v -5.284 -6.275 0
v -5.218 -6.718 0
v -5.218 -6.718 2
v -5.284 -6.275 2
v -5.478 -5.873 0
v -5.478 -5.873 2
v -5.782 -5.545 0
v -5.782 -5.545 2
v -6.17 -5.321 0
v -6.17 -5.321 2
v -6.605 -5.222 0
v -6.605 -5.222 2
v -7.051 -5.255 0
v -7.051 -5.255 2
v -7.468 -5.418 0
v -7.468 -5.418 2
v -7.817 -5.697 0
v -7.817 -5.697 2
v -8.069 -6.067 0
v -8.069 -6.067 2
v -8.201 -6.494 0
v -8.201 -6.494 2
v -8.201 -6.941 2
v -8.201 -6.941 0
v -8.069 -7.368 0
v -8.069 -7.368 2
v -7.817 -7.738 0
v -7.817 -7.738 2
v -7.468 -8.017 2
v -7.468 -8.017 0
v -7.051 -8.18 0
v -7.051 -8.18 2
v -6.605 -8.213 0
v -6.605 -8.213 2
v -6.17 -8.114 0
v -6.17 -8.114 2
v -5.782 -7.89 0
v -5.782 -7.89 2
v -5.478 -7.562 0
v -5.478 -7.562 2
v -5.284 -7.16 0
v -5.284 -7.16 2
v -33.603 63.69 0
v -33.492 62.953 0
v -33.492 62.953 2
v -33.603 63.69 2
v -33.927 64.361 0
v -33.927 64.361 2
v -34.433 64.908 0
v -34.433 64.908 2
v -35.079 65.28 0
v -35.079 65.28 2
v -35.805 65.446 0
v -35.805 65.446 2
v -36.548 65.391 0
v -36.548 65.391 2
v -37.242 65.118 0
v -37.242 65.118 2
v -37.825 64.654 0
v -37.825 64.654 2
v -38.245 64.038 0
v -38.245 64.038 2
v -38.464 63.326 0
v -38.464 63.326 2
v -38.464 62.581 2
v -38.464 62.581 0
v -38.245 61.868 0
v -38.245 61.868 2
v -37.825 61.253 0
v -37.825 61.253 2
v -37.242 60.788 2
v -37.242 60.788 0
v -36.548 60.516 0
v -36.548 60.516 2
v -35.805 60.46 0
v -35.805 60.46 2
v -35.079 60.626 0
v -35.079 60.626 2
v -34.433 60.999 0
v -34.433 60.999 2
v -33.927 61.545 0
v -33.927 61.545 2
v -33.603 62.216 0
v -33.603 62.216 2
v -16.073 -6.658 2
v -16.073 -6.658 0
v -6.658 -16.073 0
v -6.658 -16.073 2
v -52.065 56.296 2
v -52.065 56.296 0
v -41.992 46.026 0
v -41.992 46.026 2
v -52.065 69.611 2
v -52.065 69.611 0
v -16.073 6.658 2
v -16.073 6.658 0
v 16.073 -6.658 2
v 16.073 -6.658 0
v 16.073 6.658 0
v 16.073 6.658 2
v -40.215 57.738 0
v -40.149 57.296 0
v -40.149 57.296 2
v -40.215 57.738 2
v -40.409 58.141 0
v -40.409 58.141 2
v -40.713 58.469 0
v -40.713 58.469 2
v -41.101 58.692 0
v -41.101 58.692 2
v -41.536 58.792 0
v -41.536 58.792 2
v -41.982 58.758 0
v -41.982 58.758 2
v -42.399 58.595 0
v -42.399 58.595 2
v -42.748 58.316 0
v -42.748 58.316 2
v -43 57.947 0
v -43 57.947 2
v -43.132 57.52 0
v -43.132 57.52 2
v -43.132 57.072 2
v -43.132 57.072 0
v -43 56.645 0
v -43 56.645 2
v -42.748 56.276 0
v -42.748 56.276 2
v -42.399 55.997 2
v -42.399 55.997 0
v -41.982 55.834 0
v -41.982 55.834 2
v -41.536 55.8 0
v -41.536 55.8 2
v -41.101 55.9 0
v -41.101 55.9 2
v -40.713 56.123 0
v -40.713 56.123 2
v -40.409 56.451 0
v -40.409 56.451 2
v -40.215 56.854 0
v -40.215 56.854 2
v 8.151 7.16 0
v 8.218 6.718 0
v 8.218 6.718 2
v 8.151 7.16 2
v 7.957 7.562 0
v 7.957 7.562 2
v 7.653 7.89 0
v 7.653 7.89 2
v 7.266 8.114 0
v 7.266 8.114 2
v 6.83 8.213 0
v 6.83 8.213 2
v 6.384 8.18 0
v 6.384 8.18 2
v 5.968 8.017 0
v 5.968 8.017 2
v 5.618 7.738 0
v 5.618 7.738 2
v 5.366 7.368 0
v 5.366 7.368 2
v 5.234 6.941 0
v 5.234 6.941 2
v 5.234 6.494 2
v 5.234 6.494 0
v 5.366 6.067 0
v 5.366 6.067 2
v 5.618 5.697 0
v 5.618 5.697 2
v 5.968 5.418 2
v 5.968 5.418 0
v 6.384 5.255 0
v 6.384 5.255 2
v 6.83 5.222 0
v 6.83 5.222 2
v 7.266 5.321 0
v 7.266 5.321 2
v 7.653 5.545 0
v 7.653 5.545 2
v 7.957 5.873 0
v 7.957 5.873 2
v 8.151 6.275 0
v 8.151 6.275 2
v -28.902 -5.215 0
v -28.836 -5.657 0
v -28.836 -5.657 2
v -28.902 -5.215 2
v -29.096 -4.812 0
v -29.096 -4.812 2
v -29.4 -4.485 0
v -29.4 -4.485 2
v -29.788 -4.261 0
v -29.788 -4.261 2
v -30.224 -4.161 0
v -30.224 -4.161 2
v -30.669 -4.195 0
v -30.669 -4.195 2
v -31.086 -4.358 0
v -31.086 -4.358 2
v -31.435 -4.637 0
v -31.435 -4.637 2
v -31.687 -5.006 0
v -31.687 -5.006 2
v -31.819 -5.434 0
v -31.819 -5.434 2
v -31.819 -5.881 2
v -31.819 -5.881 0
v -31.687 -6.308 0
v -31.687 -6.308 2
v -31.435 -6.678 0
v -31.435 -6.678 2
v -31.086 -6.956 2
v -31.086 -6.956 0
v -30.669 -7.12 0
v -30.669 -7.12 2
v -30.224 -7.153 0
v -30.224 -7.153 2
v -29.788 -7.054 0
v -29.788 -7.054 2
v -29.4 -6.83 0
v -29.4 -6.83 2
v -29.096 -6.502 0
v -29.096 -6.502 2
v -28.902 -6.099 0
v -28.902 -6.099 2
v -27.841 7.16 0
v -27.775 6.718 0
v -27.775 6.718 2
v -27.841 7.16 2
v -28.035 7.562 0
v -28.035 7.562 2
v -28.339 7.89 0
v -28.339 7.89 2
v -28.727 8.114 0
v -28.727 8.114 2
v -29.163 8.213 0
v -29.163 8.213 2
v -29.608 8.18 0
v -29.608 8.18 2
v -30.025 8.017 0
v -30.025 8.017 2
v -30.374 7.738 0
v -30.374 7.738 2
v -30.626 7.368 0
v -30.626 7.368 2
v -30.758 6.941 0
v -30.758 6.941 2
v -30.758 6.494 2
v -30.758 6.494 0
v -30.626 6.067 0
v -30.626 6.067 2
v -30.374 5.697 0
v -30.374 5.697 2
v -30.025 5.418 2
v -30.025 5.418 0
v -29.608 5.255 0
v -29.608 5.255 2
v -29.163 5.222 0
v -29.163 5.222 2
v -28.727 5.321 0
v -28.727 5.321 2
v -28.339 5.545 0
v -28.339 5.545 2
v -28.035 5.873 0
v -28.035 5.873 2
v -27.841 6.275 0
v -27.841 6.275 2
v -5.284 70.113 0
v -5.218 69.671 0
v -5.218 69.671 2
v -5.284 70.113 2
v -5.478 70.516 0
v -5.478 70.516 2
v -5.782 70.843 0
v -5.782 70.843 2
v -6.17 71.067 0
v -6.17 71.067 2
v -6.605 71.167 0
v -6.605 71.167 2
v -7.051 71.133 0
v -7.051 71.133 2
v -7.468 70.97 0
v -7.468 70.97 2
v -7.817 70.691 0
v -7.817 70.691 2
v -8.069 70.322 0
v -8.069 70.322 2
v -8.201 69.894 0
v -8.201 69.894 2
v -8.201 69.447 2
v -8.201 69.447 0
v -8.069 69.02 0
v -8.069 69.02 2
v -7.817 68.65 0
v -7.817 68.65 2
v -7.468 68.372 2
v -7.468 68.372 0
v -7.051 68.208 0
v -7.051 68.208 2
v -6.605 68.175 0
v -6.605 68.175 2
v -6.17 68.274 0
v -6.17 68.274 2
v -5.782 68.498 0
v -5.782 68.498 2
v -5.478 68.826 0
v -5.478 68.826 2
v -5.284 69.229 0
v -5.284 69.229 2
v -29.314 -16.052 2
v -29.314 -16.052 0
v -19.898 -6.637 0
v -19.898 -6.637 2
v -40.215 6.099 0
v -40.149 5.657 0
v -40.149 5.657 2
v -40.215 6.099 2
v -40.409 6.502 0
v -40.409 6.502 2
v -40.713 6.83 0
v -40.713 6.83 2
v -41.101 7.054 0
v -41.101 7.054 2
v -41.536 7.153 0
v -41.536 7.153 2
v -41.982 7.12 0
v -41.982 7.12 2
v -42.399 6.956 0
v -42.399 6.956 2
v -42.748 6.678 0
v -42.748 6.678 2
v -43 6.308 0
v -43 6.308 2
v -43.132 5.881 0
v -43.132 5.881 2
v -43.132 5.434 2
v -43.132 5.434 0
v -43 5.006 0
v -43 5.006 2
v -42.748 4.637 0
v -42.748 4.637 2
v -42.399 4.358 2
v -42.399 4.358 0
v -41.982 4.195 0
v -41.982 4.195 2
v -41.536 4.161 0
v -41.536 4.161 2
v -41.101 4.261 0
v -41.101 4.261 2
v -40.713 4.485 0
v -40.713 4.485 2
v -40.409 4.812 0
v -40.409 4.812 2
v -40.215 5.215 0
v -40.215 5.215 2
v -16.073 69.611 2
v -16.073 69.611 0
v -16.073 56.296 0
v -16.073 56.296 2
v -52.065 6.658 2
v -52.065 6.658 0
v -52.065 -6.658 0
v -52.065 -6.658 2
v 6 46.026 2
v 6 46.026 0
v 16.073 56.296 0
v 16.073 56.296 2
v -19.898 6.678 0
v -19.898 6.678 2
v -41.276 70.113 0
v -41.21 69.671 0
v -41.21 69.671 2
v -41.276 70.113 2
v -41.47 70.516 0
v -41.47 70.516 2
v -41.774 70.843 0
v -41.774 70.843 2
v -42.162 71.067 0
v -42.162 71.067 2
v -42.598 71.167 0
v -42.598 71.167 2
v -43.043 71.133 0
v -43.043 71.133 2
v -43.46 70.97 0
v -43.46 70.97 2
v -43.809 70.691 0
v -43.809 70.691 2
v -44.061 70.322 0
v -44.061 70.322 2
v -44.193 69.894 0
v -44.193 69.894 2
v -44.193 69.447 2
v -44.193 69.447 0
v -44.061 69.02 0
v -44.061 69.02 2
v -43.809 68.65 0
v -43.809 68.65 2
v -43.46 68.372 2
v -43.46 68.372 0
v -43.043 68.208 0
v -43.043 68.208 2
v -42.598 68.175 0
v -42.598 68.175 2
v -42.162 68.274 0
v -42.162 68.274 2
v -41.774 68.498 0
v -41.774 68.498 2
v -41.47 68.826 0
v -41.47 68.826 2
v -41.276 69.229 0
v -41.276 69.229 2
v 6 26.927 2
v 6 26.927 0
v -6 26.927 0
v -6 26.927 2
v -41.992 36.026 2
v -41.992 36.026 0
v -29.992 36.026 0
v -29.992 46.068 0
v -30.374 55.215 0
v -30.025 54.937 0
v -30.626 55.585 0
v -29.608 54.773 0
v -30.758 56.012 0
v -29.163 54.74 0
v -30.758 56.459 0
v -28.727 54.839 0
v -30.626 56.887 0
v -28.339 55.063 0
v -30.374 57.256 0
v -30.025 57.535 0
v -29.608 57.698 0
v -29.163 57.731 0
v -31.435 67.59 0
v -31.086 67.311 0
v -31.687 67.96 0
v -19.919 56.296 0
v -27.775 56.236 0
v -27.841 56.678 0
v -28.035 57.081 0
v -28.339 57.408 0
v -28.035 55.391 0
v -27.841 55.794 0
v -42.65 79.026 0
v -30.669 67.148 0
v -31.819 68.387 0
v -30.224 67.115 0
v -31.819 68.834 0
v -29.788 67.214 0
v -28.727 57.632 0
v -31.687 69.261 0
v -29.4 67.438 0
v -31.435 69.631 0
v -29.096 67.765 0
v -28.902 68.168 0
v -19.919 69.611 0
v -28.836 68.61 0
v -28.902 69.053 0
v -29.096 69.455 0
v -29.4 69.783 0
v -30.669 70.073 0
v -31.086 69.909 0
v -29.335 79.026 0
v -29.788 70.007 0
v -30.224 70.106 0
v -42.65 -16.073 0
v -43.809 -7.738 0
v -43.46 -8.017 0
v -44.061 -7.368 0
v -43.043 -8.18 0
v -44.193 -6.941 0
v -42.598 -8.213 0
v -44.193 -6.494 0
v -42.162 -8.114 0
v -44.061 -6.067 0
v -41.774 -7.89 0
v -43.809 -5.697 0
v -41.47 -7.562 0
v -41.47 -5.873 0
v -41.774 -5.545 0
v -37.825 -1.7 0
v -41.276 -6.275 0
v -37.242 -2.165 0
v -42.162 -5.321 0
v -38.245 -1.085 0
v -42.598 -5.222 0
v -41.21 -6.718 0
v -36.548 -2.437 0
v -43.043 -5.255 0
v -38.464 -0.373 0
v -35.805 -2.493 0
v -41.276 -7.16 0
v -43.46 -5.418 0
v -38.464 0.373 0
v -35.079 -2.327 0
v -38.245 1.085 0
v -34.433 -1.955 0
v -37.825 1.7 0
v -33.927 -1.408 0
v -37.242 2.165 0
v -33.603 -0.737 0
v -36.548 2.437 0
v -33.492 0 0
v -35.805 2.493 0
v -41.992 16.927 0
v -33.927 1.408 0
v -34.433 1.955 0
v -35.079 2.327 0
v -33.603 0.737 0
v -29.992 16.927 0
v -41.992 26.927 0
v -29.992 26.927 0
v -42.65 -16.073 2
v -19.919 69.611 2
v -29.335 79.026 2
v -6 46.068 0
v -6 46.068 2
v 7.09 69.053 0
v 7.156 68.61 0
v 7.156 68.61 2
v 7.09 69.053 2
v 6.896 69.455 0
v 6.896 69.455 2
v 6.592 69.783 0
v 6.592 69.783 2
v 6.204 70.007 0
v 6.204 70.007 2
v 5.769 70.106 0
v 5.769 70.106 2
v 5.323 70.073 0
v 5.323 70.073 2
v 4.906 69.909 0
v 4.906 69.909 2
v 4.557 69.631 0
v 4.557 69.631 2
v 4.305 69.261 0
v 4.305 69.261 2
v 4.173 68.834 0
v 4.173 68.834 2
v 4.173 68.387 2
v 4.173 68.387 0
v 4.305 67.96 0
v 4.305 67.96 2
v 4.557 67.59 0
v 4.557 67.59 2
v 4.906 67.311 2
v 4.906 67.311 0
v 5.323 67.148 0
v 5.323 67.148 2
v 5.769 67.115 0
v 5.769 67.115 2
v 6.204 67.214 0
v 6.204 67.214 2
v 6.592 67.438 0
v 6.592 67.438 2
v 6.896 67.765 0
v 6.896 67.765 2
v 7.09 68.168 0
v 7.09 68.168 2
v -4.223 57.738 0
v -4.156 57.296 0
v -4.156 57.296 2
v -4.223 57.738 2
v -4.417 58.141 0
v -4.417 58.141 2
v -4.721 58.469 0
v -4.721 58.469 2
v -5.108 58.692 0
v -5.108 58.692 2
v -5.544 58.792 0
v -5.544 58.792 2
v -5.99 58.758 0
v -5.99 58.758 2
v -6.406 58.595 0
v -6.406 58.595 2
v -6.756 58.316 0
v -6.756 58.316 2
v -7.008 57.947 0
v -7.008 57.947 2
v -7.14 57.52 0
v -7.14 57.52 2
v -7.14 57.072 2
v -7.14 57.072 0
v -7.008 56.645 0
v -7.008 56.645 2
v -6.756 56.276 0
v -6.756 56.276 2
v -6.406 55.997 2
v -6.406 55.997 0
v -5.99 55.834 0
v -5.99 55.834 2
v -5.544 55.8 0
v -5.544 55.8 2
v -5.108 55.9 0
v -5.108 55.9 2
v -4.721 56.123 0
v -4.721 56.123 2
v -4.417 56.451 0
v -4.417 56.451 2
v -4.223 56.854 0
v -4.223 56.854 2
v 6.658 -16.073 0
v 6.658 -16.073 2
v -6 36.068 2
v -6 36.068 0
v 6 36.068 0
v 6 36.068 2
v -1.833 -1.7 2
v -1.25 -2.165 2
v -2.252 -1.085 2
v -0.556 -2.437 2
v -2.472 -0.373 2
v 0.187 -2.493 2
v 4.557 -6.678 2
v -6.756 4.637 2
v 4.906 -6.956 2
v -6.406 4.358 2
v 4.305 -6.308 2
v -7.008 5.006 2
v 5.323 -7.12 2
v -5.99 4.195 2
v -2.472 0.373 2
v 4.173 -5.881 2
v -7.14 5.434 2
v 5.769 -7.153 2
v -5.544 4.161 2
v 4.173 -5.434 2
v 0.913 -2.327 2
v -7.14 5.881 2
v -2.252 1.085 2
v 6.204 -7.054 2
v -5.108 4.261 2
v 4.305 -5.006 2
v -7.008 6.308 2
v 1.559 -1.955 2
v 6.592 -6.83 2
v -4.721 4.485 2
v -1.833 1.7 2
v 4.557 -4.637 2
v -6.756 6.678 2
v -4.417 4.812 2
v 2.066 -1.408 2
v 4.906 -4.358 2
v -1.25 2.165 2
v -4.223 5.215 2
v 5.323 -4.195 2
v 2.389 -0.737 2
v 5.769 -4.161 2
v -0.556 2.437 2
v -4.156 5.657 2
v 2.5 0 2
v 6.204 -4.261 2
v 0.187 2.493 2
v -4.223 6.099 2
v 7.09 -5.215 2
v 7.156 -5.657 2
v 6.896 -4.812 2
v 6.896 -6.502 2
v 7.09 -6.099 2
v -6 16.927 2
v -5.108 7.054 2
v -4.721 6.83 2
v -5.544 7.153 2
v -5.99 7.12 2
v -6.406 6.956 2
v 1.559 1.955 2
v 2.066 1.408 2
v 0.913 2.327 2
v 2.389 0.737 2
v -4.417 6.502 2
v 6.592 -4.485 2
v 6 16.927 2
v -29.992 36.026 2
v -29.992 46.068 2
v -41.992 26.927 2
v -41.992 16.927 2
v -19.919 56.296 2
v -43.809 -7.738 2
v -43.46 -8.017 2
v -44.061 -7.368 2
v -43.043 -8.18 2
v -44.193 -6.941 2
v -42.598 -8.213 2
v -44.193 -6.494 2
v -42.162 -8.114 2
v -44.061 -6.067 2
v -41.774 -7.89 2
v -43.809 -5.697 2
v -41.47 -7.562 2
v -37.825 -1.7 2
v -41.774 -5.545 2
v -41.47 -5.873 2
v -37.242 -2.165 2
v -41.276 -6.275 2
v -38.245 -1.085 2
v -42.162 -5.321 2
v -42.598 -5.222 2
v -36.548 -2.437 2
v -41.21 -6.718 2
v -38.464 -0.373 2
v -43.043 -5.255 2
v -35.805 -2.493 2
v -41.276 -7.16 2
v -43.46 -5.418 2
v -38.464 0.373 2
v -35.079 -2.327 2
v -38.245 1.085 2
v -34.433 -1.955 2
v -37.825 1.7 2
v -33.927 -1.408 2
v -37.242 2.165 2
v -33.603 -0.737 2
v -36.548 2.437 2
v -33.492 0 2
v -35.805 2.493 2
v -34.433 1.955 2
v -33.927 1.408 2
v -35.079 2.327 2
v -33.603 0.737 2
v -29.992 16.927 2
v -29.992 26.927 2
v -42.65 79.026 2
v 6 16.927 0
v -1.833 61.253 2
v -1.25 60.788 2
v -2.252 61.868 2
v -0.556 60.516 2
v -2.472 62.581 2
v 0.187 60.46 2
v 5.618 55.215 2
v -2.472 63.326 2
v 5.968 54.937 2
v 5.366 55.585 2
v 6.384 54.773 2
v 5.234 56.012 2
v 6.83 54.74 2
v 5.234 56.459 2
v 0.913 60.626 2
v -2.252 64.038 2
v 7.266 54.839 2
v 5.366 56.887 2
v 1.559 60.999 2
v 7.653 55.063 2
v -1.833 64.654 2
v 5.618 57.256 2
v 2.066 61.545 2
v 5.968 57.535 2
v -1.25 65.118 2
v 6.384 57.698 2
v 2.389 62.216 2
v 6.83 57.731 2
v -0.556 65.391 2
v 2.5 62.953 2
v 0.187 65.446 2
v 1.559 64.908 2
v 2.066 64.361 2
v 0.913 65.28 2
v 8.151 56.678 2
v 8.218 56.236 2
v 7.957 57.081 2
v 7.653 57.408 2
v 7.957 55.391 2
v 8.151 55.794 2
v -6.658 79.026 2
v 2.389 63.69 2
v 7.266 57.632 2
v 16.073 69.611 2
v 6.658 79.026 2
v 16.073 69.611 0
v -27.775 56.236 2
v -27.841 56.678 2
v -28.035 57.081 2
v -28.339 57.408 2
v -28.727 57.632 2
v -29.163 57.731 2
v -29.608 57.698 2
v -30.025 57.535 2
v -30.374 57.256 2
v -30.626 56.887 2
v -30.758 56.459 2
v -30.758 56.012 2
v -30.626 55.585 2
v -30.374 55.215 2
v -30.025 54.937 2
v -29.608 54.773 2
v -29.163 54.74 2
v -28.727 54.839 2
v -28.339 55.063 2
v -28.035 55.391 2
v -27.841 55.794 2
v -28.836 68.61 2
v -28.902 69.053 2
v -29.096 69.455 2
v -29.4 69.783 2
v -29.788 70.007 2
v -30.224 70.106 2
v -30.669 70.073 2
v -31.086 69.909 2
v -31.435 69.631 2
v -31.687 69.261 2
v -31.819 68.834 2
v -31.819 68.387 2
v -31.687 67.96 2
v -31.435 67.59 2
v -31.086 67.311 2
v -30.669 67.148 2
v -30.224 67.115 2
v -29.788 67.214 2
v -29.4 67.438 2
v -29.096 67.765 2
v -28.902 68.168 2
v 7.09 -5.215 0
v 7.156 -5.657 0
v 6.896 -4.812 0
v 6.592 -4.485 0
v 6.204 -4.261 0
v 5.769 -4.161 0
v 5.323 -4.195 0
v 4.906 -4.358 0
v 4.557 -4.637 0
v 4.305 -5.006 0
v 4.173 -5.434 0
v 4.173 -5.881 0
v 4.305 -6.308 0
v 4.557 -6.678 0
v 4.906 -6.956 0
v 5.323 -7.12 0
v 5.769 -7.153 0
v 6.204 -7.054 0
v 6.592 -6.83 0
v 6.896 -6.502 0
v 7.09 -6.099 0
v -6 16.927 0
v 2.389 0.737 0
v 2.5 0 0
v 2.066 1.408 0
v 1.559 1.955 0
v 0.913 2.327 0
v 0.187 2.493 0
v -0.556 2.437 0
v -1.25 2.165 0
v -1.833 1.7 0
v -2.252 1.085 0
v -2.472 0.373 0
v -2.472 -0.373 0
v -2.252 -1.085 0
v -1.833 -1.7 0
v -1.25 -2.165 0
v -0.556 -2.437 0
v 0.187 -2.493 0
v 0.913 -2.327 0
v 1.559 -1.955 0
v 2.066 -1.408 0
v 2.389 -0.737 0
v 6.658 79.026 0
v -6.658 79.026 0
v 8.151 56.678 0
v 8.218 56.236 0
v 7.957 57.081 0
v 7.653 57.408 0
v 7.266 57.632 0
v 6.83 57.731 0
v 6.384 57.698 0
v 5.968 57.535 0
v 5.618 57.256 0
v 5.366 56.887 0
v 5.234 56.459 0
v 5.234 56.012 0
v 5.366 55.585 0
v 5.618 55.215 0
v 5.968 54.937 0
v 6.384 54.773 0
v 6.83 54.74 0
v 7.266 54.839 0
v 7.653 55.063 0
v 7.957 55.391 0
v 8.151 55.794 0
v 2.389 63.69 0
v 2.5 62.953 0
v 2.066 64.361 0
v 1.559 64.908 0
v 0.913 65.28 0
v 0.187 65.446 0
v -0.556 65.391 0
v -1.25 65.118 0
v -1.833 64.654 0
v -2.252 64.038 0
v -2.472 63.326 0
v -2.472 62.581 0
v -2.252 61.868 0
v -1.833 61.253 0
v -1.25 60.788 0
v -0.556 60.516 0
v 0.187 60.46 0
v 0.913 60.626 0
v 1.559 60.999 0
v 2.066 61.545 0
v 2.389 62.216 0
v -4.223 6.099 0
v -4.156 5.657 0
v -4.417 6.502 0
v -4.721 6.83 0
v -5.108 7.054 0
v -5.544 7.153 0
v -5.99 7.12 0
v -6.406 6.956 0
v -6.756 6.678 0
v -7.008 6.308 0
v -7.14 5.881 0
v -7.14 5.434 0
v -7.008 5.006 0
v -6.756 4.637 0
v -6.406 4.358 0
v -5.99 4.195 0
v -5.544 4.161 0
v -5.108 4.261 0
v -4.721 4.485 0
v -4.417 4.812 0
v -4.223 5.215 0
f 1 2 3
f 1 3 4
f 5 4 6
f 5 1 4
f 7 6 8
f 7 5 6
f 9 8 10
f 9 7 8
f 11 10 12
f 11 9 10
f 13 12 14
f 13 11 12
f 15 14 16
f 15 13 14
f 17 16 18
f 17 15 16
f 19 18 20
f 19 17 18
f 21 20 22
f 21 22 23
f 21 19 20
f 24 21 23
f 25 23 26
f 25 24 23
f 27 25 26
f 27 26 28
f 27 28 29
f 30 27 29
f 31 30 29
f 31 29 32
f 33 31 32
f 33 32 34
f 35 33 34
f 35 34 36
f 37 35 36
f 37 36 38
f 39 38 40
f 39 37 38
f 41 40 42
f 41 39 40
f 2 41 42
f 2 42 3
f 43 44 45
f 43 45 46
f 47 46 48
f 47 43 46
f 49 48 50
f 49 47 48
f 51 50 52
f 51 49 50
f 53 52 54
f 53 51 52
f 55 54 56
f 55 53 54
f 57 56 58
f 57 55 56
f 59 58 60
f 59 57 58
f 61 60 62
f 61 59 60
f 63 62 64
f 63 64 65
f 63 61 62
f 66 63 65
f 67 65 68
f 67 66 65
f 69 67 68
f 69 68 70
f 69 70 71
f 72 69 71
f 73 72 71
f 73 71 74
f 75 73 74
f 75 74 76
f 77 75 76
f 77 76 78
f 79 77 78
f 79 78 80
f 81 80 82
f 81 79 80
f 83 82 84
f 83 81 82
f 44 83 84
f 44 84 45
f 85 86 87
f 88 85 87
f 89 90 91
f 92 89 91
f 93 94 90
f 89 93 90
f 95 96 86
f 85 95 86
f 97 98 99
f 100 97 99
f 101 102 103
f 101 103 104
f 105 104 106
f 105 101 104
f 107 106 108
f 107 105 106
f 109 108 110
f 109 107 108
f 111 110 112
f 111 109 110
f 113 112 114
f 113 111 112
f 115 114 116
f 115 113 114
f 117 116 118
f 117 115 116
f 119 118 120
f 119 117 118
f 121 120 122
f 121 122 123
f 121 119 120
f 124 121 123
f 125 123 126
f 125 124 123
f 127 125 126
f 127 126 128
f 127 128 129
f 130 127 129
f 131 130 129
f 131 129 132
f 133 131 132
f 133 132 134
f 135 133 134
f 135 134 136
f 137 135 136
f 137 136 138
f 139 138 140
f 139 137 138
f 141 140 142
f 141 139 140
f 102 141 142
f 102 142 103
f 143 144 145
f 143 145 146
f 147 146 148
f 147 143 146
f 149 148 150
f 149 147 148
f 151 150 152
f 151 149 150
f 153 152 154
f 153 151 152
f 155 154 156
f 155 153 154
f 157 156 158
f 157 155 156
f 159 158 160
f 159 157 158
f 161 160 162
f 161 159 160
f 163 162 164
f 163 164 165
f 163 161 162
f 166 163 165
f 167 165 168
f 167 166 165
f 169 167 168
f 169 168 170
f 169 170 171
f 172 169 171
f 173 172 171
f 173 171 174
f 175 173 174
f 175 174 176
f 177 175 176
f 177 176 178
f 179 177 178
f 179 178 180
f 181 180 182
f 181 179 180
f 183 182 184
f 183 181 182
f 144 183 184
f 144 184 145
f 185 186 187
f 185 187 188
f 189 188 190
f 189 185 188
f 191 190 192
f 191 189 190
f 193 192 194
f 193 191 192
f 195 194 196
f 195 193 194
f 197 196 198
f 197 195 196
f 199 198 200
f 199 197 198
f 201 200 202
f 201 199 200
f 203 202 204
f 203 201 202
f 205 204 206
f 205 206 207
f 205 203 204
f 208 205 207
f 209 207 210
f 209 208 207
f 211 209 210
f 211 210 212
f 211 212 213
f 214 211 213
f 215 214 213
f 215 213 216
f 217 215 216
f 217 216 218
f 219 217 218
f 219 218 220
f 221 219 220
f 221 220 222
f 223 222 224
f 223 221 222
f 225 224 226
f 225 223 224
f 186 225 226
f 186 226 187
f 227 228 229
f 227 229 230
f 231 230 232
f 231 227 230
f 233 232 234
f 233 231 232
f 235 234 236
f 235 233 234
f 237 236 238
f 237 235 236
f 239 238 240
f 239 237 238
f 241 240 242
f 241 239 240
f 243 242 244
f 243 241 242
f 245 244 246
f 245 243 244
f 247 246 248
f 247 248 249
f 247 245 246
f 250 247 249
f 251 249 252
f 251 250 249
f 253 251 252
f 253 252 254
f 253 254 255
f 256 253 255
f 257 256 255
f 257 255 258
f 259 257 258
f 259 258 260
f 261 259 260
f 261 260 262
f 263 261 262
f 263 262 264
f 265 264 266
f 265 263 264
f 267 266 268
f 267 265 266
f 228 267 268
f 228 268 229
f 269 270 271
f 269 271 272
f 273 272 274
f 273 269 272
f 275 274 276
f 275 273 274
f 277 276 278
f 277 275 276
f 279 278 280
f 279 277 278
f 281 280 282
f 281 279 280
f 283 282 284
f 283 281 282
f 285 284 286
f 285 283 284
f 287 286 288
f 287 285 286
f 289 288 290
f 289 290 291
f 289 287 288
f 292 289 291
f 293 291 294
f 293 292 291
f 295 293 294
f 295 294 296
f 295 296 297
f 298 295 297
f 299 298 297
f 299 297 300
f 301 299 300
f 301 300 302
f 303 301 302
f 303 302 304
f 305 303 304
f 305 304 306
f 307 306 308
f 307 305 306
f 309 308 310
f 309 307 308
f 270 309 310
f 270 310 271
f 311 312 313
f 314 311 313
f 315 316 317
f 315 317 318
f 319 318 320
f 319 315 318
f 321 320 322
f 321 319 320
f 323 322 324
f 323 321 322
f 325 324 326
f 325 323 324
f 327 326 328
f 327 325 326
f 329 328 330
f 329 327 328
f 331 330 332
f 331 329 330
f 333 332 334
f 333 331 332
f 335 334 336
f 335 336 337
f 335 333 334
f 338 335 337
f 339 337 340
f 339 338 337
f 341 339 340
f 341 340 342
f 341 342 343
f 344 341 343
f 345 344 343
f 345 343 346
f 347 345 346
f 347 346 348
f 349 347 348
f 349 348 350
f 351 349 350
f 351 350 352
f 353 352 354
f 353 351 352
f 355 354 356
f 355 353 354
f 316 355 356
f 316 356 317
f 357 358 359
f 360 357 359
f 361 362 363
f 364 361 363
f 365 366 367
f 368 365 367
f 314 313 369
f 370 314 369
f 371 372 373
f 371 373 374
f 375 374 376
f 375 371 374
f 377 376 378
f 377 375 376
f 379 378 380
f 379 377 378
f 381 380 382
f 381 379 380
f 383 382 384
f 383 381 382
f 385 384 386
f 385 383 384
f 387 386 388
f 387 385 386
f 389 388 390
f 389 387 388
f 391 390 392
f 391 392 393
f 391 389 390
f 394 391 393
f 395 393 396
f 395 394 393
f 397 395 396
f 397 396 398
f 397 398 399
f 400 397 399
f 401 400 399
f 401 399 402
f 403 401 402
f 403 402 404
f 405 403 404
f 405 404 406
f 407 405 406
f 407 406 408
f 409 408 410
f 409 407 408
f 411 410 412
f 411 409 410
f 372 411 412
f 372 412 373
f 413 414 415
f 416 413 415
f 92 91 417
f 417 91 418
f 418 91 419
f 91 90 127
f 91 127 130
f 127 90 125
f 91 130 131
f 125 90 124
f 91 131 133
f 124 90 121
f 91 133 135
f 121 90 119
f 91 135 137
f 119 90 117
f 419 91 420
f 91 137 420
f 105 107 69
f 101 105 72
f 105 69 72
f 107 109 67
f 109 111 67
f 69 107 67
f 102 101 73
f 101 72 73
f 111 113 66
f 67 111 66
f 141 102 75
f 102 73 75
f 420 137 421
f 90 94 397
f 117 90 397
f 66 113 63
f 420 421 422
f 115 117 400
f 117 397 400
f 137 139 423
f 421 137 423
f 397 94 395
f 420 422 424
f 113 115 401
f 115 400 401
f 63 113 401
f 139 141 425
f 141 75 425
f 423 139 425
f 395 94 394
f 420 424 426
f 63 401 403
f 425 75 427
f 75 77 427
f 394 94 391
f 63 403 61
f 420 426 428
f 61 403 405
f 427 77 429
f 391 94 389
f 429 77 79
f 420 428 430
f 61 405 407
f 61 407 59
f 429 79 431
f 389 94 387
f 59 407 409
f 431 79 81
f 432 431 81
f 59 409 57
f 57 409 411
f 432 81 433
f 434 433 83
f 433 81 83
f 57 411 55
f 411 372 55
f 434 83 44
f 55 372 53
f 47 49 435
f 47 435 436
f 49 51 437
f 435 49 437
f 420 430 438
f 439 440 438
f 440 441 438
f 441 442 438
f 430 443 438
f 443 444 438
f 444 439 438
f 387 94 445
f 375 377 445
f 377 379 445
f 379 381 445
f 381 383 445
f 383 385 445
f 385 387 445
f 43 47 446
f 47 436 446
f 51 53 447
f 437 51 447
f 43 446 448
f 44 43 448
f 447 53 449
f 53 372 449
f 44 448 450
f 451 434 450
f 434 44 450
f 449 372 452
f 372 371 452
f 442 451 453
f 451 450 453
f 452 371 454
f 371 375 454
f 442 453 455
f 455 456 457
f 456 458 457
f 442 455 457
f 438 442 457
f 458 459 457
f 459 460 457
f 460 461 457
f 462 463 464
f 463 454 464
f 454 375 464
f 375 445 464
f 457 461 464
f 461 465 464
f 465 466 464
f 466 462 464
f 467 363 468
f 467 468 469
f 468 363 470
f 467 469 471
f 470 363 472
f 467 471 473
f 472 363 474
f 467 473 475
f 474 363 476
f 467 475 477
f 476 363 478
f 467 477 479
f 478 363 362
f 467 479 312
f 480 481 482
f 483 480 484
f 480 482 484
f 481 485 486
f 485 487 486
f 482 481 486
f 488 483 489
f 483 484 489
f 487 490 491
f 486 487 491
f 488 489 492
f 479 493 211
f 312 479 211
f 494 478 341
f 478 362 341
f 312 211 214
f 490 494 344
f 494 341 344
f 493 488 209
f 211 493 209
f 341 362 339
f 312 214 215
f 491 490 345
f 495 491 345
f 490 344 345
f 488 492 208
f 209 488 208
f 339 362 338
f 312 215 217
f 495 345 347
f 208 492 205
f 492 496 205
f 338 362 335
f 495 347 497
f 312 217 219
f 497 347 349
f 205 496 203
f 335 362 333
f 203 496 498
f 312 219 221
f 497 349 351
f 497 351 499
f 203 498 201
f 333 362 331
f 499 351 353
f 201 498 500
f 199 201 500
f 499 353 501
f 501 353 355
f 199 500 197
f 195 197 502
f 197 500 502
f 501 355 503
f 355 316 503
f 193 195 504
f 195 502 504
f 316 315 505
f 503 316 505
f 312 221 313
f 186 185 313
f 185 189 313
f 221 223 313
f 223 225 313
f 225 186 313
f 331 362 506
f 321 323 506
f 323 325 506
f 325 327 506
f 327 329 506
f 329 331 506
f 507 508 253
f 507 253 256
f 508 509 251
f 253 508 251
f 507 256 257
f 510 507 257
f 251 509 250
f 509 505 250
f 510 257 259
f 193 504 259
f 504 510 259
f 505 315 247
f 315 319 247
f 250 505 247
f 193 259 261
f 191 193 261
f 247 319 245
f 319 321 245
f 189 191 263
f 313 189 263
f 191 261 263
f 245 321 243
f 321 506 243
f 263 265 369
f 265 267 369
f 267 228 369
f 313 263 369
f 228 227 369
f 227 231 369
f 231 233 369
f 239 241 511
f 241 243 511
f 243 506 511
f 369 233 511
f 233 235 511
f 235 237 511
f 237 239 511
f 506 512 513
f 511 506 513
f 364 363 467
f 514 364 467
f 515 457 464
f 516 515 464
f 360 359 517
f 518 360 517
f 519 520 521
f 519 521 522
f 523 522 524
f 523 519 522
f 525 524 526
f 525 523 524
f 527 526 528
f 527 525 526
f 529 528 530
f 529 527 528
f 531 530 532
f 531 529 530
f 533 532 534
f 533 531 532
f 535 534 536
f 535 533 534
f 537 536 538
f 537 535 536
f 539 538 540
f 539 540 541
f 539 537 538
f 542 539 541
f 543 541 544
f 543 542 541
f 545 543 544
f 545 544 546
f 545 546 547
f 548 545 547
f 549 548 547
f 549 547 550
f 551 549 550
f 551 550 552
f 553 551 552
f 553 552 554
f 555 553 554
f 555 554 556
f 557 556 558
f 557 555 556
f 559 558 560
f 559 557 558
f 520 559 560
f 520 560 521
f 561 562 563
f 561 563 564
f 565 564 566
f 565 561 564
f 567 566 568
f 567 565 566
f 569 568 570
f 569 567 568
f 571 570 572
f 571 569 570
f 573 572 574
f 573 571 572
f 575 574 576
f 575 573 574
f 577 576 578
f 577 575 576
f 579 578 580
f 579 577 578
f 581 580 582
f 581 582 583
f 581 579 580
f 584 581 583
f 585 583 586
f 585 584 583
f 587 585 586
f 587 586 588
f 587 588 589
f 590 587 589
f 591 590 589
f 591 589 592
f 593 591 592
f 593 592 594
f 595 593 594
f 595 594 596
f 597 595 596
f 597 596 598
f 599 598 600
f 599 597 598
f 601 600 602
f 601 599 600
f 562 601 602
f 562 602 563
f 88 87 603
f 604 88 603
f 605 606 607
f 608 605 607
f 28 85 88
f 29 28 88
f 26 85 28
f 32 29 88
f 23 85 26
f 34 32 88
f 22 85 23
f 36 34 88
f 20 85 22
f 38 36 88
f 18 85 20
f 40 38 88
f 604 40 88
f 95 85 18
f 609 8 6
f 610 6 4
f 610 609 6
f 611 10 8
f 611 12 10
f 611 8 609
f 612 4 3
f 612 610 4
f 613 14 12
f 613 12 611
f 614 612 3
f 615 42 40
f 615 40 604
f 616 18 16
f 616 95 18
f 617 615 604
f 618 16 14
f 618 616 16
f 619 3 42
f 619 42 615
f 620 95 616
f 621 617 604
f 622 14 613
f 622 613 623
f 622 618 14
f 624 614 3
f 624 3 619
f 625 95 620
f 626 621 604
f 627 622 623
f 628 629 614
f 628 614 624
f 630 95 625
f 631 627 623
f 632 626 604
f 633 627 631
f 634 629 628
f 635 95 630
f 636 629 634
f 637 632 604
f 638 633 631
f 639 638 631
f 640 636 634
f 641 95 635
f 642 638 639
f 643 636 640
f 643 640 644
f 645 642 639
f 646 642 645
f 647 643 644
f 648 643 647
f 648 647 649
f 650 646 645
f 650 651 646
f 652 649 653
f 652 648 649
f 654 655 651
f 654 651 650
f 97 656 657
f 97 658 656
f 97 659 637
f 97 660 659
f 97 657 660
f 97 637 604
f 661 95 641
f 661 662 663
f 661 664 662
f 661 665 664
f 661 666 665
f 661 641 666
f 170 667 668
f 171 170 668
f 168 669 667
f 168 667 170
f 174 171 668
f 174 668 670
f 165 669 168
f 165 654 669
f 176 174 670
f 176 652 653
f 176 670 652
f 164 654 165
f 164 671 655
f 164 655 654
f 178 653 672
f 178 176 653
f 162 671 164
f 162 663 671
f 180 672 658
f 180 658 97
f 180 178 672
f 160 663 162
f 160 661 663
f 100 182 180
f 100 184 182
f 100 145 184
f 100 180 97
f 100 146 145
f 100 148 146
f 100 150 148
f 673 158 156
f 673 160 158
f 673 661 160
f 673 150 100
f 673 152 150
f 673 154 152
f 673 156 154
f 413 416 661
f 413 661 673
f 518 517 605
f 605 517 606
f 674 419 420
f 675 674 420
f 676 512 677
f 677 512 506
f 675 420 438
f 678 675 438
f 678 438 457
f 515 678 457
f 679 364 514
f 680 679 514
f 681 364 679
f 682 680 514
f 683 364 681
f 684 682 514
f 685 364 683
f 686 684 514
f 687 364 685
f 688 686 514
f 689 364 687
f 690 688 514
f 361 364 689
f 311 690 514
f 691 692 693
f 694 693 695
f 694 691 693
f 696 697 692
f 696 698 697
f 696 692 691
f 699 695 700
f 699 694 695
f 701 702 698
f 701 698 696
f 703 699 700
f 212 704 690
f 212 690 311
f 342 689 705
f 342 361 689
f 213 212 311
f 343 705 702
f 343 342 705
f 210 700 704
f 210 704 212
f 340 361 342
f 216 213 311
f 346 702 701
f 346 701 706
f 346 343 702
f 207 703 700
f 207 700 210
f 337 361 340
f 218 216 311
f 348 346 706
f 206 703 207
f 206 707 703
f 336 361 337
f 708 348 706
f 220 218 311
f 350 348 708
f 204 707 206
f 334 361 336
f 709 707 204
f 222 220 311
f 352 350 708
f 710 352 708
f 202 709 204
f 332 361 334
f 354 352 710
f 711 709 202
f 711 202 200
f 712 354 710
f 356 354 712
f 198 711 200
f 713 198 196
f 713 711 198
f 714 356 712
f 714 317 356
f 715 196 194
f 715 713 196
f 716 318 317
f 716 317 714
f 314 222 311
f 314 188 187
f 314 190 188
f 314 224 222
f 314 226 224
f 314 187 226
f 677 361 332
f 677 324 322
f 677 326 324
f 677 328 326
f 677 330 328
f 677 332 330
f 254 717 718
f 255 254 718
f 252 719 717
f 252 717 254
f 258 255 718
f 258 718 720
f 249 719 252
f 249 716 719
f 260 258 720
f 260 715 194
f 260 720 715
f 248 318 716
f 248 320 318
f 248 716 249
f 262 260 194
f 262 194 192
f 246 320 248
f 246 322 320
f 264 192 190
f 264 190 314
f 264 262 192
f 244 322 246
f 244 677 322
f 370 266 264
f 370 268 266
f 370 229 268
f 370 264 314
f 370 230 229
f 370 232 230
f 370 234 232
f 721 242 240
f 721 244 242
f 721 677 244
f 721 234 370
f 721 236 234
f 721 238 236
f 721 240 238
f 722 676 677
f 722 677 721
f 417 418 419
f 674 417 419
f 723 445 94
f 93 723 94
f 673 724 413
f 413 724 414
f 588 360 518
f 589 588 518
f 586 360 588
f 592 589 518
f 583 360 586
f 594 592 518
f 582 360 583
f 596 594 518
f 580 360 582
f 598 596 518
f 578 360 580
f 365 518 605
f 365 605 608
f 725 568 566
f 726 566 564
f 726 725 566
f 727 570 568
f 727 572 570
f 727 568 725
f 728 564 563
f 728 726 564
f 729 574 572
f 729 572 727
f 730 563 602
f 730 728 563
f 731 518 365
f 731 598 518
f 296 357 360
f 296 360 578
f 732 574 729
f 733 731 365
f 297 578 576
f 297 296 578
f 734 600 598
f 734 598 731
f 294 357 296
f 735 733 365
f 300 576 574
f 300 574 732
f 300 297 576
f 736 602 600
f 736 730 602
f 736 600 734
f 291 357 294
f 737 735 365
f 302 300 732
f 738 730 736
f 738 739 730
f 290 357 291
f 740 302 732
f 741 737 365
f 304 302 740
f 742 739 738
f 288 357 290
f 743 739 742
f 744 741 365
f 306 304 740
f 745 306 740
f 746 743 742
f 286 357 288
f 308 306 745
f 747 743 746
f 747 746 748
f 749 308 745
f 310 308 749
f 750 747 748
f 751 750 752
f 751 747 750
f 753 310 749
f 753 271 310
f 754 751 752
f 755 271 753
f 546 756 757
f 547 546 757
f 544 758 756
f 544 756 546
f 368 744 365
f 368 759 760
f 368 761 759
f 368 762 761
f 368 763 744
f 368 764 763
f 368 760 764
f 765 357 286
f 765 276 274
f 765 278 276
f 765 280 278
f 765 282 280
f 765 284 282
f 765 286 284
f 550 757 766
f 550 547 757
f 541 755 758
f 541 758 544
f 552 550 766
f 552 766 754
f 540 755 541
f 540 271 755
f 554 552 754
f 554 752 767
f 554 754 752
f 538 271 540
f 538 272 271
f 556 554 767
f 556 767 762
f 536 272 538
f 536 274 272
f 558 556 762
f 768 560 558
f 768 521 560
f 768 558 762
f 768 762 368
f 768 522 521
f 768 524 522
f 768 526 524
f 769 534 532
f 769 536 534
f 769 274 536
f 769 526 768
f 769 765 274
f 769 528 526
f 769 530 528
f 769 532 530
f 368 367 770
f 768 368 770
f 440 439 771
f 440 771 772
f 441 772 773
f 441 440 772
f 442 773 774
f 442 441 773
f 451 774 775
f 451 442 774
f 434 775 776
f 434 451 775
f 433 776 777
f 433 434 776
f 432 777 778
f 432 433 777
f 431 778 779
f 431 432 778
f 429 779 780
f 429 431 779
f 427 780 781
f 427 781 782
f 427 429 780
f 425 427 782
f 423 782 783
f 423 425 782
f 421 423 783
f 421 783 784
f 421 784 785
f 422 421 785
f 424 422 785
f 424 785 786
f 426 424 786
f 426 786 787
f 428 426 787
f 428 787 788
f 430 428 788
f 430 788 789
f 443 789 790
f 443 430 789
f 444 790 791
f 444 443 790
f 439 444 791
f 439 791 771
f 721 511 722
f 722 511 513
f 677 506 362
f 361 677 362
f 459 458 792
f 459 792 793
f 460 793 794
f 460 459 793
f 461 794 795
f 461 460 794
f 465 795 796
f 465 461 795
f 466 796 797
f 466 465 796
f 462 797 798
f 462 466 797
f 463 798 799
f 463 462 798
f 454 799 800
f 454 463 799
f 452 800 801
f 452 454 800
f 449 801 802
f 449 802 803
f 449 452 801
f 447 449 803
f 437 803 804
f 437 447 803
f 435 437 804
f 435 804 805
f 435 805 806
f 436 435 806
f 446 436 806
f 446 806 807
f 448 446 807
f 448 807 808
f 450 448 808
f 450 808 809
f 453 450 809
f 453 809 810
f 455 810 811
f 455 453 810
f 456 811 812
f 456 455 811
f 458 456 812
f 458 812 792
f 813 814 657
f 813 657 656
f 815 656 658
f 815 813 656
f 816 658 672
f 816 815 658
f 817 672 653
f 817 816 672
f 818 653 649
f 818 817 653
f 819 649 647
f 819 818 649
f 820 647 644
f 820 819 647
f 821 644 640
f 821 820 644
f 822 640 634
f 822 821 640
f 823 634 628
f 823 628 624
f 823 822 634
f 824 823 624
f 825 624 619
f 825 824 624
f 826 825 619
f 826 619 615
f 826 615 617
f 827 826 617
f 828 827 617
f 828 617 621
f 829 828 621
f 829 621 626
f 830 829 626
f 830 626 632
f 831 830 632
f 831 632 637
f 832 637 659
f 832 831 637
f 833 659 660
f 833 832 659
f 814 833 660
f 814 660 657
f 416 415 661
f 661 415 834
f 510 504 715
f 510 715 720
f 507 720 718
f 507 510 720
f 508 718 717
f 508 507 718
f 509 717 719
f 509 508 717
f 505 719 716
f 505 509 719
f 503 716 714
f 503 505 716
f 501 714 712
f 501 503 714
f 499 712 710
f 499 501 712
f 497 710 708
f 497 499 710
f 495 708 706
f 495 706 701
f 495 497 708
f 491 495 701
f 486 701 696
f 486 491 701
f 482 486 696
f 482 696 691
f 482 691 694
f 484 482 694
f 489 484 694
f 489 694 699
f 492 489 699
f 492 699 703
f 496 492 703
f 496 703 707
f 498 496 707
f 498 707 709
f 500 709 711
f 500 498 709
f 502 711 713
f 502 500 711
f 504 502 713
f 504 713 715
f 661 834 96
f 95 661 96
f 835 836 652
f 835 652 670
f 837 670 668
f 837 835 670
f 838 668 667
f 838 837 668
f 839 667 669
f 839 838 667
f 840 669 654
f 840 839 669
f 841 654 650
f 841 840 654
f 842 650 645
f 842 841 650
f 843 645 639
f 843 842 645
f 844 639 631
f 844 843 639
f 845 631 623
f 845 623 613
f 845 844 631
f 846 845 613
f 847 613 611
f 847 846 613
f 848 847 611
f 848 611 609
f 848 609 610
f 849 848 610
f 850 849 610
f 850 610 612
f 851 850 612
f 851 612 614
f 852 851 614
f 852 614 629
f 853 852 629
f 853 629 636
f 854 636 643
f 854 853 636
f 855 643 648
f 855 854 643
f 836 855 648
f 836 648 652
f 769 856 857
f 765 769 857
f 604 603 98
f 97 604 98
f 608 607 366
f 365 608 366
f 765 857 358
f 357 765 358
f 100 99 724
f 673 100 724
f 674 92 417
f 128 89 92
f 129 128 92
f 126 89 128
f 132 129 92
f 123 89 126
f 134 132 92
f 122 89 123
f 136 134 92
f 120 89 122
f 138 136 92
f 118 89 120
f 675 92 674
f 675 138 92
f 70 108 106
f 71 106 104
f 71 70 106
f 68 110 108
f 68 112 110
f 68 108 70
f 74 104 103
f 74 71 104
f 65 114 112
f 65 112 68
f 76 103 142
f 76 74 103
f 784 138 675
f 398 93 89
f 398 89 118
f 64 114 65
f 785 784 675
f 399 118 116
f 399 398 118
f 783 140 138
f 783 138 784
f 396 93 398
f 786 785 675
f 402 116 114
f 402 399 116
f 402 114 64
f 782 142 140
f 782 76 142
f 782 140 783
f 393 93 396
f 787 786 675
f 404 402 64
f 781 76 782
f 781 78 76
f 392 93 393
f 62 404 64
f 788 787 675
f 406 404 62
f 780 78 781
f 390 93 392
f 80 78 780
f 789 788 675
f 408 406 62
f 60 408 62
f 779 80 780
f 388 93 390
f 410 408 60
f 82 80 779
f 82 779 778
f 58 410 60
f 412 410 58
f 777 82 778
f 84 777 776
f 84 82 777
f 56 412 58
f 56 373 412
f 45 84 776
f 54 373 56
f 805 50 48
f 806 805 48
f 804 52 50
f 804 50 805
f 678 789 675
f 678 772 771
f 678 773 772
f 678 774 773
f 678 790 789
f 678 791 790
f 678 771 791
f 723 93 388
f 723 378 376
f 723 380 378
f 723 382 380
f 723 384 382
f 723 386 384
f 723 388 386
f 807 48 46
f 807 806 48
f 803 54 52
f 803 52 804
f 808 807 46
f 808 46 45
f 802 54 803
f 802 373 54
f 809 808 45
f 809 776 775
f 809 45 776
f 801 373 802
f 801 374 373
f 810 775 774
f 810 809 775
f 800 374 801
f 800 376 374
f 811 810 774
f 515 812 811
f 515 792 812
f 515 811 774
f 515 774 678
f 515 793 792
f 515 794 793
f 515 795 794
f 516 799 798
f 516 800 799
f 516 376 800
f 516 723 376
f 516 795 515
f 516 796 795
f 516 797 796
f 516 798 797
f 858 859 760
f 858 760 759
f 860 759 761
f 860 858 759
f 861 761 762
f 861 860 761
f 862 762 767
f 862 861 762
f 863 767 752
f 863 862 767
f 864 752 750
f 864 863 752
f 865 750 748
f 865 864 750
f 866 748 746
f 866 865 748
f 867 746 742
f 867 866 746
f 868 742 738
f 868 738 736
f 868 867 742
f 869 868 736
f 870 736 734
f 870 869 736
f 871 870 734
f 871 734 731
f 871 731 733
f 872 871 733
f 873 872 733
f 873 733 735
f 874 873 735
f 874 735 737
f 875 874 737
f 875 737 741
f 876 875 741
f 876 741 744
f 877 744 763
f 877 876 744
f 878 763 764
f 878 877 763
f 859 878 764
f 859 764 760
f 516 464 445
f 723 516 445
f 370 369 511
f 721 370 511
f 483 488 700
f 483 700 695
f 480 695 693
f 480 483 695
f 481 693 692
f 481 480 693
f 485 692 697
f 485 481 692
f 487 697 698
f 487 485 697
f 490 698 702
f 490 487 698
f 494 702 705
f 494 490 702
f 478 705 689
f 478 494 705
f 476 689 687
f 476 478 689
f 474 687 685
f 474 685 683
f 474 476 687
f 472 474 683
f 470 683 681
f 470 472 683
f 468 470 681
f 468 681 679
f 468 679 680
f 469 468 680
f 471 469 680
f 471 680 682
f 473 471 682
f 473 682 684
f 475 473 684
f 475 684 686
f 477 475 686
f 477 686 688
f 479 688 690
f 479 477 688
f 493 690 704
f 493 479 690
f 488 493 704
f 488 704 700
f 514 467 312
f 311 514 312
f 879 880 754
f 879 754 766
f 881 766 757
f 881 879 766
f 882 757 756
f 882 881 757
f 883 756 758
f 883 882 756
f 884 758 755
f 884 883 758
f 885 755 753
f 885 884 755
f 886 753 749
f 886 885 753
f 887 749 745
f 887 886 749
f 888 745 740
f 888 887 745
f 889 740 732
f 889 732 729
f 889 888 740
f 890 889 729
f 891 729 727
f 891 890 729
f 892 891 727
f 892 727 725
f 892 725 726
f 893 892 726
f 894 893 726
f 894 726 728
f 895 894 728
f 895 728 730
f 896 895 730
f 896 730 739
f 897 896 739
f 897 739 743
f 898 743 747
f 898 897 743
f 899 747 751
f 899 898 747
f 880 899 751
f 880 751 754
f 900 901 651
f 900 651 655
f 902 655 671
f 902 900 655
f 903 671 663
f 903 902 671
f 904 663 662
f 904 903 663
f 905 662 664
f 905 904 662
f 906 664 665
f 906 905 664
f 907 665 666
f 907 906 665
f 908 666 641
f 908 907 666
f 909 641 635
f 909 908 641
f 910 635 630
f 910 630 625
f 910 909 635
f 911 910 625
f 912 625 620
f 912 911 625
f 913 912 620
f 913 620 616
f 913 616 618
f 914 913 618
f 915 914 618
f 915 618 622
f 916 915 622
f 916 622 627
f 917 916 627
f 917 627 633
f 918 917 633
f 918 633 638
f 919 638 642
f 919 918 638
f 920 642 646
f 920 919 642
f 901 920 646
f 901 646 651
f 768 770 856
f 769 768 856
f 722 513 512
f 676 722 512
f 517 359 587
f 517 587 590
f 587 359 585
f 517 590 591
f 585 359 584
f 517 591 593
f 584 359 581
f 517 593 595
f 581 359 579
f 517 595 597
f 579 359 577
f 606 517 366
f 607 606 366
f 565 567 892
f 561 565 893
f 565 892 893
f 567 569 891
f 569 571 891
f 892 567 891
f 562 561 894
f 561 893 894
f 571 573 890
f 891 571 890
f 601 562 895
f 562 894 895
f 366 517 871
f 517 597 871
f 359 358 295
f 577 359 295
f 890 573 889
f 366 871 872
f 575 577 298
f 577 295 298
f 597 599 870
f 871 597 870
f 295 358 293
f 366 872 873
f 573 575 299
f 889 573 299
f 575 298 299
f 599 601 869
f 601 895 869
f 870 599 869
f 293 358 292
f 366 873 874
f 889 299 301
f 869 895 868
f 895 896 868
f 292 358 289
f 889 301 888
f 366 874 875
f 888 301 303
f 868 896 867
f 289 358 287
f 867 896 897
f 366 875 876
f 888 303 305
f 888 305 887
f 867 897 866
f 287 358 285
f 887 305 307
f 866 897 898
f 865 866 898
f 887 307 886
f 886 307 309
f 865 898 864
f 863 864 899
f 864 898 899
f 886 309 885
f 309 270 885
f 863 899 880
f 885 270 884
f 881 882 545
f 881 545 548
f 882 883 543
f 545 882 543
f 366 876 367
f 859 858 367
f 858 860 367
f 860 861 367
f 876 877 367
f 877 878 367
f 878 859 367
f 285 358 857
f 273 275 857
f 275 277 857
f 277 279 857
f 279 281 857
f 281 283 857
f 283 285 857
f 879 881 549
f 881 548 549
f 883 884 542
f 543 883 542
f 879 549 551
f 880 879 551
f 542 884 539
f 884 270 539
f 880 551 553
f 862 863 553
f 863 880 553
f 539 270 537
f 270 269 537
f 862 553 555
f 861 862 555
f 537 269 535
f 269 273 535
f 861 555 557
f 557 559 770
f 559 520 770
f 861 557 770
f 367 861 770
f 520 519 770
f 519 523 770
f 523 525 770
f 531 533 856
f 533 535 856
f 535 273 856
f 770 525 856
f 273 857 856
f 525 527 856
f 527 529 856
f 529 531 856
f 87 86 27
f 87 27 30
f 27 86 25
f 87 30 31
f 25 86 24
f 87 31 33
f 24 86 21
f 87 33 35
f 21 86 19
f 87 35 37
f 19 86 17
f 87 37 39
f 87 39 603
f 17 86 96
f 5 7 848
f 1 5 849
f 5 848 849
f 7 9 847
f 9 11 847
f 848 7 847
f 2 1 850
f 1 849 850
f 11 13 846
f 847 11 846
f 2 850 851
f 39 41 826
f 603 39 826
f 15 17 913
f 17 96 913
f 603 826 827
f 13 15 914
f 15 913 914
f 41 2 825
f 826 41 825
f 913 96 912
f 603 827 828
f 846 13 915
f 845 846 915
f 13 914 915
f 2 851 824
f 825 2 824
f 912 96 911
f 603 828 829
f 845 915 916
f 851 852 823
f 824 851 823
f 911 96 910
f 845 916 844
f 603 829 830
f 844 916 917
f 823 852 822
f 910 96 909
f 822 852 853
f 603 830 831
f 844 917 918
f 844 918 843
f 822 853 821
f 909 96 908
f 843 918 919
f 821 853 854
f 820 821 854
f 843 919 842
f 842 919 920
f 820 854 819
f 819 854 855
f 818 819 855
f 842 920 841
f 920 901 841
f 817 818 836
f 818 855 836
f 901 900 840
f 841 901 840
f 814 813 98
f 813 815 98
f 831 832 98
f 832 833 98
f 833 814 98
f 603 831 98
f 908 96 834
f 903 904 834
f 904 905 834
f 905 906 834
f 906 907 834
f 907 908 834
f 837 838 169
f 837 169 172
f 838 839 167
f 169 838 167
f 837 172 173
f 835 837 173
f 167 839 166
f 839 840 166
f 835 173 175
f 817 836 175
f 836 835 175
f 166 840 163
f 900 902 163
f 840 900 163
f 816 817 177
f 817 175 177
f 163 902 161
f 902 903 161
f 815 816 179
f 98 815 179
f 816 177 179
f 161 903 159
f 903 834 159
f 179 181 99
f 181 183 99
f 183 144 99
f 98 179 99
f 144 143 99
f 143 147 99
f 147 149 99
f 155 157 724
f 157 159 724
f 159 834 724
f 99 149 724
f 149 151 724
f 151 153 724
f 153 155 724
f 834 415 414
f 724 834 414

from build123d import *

# Parameters (mm, degrees)
F0_R     = 1.5
F0_R_2   = 2.5
F1_DEPTH = 2


with BuildPart() as f1:
    # F0 (on Top) → F1 (new body)
    with BuildSketch(Plane.XY):
        Polygon((16.072823, 6.657581), (6, 16.927177), (6, 26.927177), (-6, 26.927177), (-6, 16.927177), (-16.072823, 6.657581), (-16.072823, -6.657581), (-6.657581, -16.072823), (6.657581, -16.072823), (16.072823, -6.657581), align=None)
        with Locations((-6.717514, -6.717514)):
            Circle(F0_R, mode=Mode.SUBTRACT)
        with Locations((-5.656454, 5.657254)):
            Circle(F0_R, mode=Mode.SUBTRACT)
        with Locations((5.656454, -5.657254)):
            Circle(F0_R, mode=Mode.SUBTRACT)
        Circle(F0_R_2, mode=Mode.SUBTRACT)
        with Locations((6.717514, 6.717514)):
            Circle(F0_R, mode=Mode.SUBTRACT)
        Polygon((-19.898487, 6.678025), (-29.992112, 16.927177), (-29.992112, 26.927177), (-41.992112, 26.927177), (-41.992112, 16.927177), (-52.064935, 6.657581), (-52.064935, -6.657581), (-42.649693, -16.072823), (-29.313729, -16.052379), (-19.898487, -6.637137), align=None)
        with Locations((-42.709626, -6.717514)):
            Circle(F0_R, mode=Mode.SUBTRACT)
        with Locations((-35.992112, 0)):
            Circle(F0_R_2, mode=Mode.SUBTRACT)
        with Locations((-41.648566, 5.657254)):
            Circle(F0_R, mode=Mode.SUBTRACT)
        with Locations((-30.335658, -5.657254)):
            Circle(F0_R, mode=Mode.SUBTRACT)
        with Locations((-29.274598, 6.717514)):
            Circle(F0_R, mode=Mode.SUBTRACT)
        Polygon((-41.992112, 46.02602), (-41.992112, 36.02602), (-29.992112, 36.02602), (-29.992112, 46.067586), (-19.919289, 56.295615), (-19.919289, 69.610778), (-29.334531, 79.02602), (-42.649693, 79.02602), (-52.064935, 69.610778), (-52.064935, 56.295615), align=None)
        with Locations((-41.648566, 57.295942)):
            Circle(F0_R, mode=Mode.SUBTRACT)
        with Locations((-35.992112, 62.953196)):
            Circle(F0_R_2, mode=Mode.SUBTRACT)
        with Locations((-42.709626, 69.670711)):
            Circle(F0_R, mode=Mode.SUBTRACT)
        with Locations((-29.274598, 56.235682)):
            Circle(F0_R, mode=Mode.SUBTRACT)
        with Locations((-30.335658, 68.610451)):
            Circle(F0_R, mode=Mode.SUBTRACT)
        Polygon((6, 36.067586), (6, 46.02602), (16.072823, 56.295615), (16.072823, 69.610778), (6.657581, 79.02602), (-6.657581, 79.02602), (-16.072823, 69.610778), (-16.072823, 56.295615), (-6, 46.067586), (-6, 36.067586), align=None)
        with Locations((-5.656454, 57.295942)):
            Circle(F0_R, mode=Mode.SUBTRACT)
        with Locations((-6.717514, 69.670711)):
            Circle(F0_R, mode=Mode.SUBTRACT)
        with Locations((6.717514, 56.235682)):
            Circle(F0_R, mode=Mode.SUBTRACT)
        with Locations((0, 62.953196)):
            Circle(F0_R_2, mode=Mode.SUBTRACT)
        with Locations((5.656454, 68.610451)):
            Circle(F0_R, mode=Mode.SUBTRACT)
    extrude(amount=F1_DEPTH)


solid = f1.part
